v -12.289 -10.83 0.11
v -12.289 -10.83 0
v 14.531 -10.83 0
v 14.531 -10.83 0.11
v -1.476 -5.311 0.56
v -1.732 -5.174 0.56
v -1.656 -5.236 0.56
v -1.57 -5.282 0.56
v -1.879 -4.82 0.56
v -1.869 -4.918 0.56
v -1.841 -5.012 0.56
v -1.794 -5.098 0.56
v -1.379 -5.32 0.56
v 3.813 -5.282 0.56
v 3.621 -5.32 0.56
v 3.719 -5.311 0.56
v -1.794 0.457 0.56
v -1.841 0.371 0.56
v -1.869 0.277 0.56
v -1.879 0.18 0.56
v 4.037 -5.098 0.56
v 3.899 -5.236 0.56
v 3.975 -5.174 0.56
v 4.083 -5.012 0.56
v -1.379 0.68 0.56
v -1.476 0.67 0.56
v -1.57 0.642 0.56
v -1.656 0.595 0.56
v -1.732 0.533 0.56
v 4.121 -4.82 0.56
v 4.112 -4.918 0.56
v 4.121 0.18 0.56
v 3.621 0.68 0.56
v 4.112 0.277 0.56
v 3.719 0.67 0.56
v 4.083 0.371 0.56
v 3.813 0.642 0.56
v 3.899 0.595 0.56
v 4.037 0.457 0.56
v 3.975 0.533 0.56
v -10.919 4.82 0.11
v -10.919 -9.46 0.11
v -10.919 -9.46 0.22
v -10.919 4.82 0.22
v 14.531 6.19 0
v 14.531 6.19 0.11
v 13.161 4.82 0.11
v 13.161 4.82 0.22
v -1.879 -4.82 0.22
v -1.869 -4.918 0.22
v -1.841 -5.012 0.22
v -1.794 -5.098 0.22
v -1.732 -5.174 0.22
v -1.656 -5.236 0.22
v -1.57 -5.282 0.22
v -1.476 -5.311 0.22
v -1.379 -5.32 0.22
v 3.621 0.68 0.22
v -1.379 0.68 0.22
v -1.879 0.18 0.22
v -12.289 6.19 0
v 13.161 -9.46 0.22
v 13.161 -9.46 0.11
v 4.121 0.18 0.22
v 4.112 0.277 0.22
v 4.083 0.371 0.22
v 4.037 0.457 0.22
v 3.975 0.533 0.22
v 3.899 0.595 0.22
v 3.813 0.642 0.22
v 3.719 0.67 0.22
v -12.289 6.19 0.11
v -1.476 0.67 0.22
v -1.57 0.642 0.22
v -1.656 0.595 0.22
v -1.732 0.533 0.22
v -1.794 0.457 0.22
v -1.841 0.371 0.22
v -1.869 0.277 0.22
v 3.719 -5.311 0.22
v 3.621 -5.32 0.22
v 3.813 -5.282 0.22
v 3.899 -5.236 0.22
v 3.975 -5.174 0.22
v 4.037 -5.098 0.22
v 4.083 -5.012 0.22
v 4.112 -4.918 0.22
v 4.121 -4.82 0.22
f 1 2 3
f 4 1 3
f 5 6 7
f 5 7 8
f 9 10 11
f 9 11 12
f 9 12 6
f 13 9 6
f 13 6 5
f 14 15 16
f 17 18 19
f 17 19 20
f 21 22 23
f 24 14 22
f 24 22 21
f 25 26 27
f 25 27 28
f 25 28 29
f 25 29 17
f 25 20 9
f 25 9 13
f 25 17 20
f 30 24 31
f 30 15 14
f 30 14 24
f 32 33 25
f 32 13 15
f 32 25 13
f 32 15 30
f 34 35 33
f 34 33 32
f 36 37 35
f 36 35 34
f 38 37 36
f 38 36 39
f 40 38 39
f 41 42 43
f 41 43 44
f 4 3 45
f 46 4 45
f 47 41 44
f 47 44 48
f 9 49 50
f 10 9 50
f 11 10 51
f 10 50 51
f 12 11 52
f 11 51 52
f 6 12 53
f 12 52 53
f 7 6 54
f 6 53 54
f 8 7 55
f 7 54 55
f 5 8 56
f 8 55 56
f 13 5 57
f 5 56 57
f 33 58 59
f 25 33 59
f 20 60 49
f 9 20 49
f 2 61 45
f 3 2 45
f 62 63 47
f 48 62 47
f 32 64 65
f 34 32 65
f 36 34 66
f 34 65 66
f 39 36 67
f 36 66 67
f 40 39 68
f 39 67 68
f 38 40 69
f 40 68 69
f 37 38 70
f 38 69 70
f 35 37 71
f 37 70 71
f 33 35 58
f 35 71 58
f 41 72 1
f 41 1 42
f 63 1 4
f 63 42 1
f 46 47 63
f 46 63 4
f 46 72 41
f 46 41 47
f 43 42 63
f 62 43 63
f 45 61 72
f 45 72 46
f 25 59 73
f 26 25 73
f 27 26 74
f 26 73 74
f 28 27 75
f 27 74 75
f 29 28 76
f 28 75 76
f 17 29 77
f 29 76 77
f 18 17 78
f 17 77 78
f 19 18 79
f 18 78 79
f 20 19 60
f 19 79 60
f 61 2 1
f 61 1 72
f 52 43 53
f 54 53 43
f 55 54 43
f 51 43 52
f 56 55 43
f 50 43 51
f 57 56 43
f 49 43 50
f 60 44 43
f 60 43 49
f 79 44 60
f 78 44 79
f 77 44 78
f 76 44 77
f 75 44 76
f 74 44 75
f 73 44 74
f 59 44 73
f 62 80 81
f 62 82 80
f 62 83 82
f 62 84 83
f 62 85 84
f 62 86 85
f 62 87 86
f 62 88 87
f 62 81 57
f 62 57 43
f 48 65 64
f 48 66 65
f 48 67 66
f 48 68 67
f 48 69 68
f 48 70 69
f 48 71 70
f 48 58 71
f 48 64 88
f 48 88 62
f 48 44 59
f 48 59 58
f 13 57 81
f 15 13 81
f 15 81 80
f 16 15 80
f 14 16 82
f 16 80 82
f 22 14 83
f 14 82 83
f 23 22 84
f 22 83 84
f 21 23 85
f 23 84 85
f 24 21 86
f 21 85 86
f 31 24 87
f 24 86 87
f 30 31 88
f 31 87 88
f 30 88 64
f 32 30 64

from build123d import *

# Parameters (mm, degrees)
F0_W     = 26.82
F0_H     = 17.02
F1_DEPTH = 0.11
F2_W     = 24.08
F2_H     = 14.28
F3_DEPTH = 0.11
F5_DEPTH = 0.34


with BuildPart() as f1:
    # F0 (on Top) → F1 (new body)
    with BuildSketch(Plane.XY):
        with Locations((1.121439, -2.320423)):
            Rectangle(F0_W, F0_H)
    extrude(amount=F1_DEPTH)

    # F2 (on face) → F3 (join)
    with BuildSketch(Plane.XY.offset(0.11)):
        with Locations((1.121439, -2.320423)):
            Rectangle(F2_W, F2_H)
    extrude(amount=F3_DEPTH)

    # F4 (on face) → F5 (join)
    with BuildSketch(Plane.XY.offset(0.22)):
        with BuildLine():
            Line((3.621439, 0.679577), (-1.378561, 0.679577))
            ThreePointArc((-1.378561, 0.679577), (-1.732114, 0.53313), (-1.878561, 0.179577))
            Line((-1.878561, 0.179577), (-1.878561, -4.820423))
            ThreePointArc((-1.878561, -4.820423), (-1.732114, -5.173977), (-1.378561, -5.320423))
            Line((-1.378561, -5.320423), (3.621439, -5.320423))
            ThreePointArc((3.621439, -5.320423), (3.974992, -5.173977), (4.121439, -4.820423))
            Line((4.121439, -4.820423), (4.121439, 0.179577))
            ThreePointArc((4.121439, 0.179577), (3.974992, 0.53313), (3.621439, 0.679577))
        make_face()
    extrude(amount=F5_DEPTH)


solid = f1.part
